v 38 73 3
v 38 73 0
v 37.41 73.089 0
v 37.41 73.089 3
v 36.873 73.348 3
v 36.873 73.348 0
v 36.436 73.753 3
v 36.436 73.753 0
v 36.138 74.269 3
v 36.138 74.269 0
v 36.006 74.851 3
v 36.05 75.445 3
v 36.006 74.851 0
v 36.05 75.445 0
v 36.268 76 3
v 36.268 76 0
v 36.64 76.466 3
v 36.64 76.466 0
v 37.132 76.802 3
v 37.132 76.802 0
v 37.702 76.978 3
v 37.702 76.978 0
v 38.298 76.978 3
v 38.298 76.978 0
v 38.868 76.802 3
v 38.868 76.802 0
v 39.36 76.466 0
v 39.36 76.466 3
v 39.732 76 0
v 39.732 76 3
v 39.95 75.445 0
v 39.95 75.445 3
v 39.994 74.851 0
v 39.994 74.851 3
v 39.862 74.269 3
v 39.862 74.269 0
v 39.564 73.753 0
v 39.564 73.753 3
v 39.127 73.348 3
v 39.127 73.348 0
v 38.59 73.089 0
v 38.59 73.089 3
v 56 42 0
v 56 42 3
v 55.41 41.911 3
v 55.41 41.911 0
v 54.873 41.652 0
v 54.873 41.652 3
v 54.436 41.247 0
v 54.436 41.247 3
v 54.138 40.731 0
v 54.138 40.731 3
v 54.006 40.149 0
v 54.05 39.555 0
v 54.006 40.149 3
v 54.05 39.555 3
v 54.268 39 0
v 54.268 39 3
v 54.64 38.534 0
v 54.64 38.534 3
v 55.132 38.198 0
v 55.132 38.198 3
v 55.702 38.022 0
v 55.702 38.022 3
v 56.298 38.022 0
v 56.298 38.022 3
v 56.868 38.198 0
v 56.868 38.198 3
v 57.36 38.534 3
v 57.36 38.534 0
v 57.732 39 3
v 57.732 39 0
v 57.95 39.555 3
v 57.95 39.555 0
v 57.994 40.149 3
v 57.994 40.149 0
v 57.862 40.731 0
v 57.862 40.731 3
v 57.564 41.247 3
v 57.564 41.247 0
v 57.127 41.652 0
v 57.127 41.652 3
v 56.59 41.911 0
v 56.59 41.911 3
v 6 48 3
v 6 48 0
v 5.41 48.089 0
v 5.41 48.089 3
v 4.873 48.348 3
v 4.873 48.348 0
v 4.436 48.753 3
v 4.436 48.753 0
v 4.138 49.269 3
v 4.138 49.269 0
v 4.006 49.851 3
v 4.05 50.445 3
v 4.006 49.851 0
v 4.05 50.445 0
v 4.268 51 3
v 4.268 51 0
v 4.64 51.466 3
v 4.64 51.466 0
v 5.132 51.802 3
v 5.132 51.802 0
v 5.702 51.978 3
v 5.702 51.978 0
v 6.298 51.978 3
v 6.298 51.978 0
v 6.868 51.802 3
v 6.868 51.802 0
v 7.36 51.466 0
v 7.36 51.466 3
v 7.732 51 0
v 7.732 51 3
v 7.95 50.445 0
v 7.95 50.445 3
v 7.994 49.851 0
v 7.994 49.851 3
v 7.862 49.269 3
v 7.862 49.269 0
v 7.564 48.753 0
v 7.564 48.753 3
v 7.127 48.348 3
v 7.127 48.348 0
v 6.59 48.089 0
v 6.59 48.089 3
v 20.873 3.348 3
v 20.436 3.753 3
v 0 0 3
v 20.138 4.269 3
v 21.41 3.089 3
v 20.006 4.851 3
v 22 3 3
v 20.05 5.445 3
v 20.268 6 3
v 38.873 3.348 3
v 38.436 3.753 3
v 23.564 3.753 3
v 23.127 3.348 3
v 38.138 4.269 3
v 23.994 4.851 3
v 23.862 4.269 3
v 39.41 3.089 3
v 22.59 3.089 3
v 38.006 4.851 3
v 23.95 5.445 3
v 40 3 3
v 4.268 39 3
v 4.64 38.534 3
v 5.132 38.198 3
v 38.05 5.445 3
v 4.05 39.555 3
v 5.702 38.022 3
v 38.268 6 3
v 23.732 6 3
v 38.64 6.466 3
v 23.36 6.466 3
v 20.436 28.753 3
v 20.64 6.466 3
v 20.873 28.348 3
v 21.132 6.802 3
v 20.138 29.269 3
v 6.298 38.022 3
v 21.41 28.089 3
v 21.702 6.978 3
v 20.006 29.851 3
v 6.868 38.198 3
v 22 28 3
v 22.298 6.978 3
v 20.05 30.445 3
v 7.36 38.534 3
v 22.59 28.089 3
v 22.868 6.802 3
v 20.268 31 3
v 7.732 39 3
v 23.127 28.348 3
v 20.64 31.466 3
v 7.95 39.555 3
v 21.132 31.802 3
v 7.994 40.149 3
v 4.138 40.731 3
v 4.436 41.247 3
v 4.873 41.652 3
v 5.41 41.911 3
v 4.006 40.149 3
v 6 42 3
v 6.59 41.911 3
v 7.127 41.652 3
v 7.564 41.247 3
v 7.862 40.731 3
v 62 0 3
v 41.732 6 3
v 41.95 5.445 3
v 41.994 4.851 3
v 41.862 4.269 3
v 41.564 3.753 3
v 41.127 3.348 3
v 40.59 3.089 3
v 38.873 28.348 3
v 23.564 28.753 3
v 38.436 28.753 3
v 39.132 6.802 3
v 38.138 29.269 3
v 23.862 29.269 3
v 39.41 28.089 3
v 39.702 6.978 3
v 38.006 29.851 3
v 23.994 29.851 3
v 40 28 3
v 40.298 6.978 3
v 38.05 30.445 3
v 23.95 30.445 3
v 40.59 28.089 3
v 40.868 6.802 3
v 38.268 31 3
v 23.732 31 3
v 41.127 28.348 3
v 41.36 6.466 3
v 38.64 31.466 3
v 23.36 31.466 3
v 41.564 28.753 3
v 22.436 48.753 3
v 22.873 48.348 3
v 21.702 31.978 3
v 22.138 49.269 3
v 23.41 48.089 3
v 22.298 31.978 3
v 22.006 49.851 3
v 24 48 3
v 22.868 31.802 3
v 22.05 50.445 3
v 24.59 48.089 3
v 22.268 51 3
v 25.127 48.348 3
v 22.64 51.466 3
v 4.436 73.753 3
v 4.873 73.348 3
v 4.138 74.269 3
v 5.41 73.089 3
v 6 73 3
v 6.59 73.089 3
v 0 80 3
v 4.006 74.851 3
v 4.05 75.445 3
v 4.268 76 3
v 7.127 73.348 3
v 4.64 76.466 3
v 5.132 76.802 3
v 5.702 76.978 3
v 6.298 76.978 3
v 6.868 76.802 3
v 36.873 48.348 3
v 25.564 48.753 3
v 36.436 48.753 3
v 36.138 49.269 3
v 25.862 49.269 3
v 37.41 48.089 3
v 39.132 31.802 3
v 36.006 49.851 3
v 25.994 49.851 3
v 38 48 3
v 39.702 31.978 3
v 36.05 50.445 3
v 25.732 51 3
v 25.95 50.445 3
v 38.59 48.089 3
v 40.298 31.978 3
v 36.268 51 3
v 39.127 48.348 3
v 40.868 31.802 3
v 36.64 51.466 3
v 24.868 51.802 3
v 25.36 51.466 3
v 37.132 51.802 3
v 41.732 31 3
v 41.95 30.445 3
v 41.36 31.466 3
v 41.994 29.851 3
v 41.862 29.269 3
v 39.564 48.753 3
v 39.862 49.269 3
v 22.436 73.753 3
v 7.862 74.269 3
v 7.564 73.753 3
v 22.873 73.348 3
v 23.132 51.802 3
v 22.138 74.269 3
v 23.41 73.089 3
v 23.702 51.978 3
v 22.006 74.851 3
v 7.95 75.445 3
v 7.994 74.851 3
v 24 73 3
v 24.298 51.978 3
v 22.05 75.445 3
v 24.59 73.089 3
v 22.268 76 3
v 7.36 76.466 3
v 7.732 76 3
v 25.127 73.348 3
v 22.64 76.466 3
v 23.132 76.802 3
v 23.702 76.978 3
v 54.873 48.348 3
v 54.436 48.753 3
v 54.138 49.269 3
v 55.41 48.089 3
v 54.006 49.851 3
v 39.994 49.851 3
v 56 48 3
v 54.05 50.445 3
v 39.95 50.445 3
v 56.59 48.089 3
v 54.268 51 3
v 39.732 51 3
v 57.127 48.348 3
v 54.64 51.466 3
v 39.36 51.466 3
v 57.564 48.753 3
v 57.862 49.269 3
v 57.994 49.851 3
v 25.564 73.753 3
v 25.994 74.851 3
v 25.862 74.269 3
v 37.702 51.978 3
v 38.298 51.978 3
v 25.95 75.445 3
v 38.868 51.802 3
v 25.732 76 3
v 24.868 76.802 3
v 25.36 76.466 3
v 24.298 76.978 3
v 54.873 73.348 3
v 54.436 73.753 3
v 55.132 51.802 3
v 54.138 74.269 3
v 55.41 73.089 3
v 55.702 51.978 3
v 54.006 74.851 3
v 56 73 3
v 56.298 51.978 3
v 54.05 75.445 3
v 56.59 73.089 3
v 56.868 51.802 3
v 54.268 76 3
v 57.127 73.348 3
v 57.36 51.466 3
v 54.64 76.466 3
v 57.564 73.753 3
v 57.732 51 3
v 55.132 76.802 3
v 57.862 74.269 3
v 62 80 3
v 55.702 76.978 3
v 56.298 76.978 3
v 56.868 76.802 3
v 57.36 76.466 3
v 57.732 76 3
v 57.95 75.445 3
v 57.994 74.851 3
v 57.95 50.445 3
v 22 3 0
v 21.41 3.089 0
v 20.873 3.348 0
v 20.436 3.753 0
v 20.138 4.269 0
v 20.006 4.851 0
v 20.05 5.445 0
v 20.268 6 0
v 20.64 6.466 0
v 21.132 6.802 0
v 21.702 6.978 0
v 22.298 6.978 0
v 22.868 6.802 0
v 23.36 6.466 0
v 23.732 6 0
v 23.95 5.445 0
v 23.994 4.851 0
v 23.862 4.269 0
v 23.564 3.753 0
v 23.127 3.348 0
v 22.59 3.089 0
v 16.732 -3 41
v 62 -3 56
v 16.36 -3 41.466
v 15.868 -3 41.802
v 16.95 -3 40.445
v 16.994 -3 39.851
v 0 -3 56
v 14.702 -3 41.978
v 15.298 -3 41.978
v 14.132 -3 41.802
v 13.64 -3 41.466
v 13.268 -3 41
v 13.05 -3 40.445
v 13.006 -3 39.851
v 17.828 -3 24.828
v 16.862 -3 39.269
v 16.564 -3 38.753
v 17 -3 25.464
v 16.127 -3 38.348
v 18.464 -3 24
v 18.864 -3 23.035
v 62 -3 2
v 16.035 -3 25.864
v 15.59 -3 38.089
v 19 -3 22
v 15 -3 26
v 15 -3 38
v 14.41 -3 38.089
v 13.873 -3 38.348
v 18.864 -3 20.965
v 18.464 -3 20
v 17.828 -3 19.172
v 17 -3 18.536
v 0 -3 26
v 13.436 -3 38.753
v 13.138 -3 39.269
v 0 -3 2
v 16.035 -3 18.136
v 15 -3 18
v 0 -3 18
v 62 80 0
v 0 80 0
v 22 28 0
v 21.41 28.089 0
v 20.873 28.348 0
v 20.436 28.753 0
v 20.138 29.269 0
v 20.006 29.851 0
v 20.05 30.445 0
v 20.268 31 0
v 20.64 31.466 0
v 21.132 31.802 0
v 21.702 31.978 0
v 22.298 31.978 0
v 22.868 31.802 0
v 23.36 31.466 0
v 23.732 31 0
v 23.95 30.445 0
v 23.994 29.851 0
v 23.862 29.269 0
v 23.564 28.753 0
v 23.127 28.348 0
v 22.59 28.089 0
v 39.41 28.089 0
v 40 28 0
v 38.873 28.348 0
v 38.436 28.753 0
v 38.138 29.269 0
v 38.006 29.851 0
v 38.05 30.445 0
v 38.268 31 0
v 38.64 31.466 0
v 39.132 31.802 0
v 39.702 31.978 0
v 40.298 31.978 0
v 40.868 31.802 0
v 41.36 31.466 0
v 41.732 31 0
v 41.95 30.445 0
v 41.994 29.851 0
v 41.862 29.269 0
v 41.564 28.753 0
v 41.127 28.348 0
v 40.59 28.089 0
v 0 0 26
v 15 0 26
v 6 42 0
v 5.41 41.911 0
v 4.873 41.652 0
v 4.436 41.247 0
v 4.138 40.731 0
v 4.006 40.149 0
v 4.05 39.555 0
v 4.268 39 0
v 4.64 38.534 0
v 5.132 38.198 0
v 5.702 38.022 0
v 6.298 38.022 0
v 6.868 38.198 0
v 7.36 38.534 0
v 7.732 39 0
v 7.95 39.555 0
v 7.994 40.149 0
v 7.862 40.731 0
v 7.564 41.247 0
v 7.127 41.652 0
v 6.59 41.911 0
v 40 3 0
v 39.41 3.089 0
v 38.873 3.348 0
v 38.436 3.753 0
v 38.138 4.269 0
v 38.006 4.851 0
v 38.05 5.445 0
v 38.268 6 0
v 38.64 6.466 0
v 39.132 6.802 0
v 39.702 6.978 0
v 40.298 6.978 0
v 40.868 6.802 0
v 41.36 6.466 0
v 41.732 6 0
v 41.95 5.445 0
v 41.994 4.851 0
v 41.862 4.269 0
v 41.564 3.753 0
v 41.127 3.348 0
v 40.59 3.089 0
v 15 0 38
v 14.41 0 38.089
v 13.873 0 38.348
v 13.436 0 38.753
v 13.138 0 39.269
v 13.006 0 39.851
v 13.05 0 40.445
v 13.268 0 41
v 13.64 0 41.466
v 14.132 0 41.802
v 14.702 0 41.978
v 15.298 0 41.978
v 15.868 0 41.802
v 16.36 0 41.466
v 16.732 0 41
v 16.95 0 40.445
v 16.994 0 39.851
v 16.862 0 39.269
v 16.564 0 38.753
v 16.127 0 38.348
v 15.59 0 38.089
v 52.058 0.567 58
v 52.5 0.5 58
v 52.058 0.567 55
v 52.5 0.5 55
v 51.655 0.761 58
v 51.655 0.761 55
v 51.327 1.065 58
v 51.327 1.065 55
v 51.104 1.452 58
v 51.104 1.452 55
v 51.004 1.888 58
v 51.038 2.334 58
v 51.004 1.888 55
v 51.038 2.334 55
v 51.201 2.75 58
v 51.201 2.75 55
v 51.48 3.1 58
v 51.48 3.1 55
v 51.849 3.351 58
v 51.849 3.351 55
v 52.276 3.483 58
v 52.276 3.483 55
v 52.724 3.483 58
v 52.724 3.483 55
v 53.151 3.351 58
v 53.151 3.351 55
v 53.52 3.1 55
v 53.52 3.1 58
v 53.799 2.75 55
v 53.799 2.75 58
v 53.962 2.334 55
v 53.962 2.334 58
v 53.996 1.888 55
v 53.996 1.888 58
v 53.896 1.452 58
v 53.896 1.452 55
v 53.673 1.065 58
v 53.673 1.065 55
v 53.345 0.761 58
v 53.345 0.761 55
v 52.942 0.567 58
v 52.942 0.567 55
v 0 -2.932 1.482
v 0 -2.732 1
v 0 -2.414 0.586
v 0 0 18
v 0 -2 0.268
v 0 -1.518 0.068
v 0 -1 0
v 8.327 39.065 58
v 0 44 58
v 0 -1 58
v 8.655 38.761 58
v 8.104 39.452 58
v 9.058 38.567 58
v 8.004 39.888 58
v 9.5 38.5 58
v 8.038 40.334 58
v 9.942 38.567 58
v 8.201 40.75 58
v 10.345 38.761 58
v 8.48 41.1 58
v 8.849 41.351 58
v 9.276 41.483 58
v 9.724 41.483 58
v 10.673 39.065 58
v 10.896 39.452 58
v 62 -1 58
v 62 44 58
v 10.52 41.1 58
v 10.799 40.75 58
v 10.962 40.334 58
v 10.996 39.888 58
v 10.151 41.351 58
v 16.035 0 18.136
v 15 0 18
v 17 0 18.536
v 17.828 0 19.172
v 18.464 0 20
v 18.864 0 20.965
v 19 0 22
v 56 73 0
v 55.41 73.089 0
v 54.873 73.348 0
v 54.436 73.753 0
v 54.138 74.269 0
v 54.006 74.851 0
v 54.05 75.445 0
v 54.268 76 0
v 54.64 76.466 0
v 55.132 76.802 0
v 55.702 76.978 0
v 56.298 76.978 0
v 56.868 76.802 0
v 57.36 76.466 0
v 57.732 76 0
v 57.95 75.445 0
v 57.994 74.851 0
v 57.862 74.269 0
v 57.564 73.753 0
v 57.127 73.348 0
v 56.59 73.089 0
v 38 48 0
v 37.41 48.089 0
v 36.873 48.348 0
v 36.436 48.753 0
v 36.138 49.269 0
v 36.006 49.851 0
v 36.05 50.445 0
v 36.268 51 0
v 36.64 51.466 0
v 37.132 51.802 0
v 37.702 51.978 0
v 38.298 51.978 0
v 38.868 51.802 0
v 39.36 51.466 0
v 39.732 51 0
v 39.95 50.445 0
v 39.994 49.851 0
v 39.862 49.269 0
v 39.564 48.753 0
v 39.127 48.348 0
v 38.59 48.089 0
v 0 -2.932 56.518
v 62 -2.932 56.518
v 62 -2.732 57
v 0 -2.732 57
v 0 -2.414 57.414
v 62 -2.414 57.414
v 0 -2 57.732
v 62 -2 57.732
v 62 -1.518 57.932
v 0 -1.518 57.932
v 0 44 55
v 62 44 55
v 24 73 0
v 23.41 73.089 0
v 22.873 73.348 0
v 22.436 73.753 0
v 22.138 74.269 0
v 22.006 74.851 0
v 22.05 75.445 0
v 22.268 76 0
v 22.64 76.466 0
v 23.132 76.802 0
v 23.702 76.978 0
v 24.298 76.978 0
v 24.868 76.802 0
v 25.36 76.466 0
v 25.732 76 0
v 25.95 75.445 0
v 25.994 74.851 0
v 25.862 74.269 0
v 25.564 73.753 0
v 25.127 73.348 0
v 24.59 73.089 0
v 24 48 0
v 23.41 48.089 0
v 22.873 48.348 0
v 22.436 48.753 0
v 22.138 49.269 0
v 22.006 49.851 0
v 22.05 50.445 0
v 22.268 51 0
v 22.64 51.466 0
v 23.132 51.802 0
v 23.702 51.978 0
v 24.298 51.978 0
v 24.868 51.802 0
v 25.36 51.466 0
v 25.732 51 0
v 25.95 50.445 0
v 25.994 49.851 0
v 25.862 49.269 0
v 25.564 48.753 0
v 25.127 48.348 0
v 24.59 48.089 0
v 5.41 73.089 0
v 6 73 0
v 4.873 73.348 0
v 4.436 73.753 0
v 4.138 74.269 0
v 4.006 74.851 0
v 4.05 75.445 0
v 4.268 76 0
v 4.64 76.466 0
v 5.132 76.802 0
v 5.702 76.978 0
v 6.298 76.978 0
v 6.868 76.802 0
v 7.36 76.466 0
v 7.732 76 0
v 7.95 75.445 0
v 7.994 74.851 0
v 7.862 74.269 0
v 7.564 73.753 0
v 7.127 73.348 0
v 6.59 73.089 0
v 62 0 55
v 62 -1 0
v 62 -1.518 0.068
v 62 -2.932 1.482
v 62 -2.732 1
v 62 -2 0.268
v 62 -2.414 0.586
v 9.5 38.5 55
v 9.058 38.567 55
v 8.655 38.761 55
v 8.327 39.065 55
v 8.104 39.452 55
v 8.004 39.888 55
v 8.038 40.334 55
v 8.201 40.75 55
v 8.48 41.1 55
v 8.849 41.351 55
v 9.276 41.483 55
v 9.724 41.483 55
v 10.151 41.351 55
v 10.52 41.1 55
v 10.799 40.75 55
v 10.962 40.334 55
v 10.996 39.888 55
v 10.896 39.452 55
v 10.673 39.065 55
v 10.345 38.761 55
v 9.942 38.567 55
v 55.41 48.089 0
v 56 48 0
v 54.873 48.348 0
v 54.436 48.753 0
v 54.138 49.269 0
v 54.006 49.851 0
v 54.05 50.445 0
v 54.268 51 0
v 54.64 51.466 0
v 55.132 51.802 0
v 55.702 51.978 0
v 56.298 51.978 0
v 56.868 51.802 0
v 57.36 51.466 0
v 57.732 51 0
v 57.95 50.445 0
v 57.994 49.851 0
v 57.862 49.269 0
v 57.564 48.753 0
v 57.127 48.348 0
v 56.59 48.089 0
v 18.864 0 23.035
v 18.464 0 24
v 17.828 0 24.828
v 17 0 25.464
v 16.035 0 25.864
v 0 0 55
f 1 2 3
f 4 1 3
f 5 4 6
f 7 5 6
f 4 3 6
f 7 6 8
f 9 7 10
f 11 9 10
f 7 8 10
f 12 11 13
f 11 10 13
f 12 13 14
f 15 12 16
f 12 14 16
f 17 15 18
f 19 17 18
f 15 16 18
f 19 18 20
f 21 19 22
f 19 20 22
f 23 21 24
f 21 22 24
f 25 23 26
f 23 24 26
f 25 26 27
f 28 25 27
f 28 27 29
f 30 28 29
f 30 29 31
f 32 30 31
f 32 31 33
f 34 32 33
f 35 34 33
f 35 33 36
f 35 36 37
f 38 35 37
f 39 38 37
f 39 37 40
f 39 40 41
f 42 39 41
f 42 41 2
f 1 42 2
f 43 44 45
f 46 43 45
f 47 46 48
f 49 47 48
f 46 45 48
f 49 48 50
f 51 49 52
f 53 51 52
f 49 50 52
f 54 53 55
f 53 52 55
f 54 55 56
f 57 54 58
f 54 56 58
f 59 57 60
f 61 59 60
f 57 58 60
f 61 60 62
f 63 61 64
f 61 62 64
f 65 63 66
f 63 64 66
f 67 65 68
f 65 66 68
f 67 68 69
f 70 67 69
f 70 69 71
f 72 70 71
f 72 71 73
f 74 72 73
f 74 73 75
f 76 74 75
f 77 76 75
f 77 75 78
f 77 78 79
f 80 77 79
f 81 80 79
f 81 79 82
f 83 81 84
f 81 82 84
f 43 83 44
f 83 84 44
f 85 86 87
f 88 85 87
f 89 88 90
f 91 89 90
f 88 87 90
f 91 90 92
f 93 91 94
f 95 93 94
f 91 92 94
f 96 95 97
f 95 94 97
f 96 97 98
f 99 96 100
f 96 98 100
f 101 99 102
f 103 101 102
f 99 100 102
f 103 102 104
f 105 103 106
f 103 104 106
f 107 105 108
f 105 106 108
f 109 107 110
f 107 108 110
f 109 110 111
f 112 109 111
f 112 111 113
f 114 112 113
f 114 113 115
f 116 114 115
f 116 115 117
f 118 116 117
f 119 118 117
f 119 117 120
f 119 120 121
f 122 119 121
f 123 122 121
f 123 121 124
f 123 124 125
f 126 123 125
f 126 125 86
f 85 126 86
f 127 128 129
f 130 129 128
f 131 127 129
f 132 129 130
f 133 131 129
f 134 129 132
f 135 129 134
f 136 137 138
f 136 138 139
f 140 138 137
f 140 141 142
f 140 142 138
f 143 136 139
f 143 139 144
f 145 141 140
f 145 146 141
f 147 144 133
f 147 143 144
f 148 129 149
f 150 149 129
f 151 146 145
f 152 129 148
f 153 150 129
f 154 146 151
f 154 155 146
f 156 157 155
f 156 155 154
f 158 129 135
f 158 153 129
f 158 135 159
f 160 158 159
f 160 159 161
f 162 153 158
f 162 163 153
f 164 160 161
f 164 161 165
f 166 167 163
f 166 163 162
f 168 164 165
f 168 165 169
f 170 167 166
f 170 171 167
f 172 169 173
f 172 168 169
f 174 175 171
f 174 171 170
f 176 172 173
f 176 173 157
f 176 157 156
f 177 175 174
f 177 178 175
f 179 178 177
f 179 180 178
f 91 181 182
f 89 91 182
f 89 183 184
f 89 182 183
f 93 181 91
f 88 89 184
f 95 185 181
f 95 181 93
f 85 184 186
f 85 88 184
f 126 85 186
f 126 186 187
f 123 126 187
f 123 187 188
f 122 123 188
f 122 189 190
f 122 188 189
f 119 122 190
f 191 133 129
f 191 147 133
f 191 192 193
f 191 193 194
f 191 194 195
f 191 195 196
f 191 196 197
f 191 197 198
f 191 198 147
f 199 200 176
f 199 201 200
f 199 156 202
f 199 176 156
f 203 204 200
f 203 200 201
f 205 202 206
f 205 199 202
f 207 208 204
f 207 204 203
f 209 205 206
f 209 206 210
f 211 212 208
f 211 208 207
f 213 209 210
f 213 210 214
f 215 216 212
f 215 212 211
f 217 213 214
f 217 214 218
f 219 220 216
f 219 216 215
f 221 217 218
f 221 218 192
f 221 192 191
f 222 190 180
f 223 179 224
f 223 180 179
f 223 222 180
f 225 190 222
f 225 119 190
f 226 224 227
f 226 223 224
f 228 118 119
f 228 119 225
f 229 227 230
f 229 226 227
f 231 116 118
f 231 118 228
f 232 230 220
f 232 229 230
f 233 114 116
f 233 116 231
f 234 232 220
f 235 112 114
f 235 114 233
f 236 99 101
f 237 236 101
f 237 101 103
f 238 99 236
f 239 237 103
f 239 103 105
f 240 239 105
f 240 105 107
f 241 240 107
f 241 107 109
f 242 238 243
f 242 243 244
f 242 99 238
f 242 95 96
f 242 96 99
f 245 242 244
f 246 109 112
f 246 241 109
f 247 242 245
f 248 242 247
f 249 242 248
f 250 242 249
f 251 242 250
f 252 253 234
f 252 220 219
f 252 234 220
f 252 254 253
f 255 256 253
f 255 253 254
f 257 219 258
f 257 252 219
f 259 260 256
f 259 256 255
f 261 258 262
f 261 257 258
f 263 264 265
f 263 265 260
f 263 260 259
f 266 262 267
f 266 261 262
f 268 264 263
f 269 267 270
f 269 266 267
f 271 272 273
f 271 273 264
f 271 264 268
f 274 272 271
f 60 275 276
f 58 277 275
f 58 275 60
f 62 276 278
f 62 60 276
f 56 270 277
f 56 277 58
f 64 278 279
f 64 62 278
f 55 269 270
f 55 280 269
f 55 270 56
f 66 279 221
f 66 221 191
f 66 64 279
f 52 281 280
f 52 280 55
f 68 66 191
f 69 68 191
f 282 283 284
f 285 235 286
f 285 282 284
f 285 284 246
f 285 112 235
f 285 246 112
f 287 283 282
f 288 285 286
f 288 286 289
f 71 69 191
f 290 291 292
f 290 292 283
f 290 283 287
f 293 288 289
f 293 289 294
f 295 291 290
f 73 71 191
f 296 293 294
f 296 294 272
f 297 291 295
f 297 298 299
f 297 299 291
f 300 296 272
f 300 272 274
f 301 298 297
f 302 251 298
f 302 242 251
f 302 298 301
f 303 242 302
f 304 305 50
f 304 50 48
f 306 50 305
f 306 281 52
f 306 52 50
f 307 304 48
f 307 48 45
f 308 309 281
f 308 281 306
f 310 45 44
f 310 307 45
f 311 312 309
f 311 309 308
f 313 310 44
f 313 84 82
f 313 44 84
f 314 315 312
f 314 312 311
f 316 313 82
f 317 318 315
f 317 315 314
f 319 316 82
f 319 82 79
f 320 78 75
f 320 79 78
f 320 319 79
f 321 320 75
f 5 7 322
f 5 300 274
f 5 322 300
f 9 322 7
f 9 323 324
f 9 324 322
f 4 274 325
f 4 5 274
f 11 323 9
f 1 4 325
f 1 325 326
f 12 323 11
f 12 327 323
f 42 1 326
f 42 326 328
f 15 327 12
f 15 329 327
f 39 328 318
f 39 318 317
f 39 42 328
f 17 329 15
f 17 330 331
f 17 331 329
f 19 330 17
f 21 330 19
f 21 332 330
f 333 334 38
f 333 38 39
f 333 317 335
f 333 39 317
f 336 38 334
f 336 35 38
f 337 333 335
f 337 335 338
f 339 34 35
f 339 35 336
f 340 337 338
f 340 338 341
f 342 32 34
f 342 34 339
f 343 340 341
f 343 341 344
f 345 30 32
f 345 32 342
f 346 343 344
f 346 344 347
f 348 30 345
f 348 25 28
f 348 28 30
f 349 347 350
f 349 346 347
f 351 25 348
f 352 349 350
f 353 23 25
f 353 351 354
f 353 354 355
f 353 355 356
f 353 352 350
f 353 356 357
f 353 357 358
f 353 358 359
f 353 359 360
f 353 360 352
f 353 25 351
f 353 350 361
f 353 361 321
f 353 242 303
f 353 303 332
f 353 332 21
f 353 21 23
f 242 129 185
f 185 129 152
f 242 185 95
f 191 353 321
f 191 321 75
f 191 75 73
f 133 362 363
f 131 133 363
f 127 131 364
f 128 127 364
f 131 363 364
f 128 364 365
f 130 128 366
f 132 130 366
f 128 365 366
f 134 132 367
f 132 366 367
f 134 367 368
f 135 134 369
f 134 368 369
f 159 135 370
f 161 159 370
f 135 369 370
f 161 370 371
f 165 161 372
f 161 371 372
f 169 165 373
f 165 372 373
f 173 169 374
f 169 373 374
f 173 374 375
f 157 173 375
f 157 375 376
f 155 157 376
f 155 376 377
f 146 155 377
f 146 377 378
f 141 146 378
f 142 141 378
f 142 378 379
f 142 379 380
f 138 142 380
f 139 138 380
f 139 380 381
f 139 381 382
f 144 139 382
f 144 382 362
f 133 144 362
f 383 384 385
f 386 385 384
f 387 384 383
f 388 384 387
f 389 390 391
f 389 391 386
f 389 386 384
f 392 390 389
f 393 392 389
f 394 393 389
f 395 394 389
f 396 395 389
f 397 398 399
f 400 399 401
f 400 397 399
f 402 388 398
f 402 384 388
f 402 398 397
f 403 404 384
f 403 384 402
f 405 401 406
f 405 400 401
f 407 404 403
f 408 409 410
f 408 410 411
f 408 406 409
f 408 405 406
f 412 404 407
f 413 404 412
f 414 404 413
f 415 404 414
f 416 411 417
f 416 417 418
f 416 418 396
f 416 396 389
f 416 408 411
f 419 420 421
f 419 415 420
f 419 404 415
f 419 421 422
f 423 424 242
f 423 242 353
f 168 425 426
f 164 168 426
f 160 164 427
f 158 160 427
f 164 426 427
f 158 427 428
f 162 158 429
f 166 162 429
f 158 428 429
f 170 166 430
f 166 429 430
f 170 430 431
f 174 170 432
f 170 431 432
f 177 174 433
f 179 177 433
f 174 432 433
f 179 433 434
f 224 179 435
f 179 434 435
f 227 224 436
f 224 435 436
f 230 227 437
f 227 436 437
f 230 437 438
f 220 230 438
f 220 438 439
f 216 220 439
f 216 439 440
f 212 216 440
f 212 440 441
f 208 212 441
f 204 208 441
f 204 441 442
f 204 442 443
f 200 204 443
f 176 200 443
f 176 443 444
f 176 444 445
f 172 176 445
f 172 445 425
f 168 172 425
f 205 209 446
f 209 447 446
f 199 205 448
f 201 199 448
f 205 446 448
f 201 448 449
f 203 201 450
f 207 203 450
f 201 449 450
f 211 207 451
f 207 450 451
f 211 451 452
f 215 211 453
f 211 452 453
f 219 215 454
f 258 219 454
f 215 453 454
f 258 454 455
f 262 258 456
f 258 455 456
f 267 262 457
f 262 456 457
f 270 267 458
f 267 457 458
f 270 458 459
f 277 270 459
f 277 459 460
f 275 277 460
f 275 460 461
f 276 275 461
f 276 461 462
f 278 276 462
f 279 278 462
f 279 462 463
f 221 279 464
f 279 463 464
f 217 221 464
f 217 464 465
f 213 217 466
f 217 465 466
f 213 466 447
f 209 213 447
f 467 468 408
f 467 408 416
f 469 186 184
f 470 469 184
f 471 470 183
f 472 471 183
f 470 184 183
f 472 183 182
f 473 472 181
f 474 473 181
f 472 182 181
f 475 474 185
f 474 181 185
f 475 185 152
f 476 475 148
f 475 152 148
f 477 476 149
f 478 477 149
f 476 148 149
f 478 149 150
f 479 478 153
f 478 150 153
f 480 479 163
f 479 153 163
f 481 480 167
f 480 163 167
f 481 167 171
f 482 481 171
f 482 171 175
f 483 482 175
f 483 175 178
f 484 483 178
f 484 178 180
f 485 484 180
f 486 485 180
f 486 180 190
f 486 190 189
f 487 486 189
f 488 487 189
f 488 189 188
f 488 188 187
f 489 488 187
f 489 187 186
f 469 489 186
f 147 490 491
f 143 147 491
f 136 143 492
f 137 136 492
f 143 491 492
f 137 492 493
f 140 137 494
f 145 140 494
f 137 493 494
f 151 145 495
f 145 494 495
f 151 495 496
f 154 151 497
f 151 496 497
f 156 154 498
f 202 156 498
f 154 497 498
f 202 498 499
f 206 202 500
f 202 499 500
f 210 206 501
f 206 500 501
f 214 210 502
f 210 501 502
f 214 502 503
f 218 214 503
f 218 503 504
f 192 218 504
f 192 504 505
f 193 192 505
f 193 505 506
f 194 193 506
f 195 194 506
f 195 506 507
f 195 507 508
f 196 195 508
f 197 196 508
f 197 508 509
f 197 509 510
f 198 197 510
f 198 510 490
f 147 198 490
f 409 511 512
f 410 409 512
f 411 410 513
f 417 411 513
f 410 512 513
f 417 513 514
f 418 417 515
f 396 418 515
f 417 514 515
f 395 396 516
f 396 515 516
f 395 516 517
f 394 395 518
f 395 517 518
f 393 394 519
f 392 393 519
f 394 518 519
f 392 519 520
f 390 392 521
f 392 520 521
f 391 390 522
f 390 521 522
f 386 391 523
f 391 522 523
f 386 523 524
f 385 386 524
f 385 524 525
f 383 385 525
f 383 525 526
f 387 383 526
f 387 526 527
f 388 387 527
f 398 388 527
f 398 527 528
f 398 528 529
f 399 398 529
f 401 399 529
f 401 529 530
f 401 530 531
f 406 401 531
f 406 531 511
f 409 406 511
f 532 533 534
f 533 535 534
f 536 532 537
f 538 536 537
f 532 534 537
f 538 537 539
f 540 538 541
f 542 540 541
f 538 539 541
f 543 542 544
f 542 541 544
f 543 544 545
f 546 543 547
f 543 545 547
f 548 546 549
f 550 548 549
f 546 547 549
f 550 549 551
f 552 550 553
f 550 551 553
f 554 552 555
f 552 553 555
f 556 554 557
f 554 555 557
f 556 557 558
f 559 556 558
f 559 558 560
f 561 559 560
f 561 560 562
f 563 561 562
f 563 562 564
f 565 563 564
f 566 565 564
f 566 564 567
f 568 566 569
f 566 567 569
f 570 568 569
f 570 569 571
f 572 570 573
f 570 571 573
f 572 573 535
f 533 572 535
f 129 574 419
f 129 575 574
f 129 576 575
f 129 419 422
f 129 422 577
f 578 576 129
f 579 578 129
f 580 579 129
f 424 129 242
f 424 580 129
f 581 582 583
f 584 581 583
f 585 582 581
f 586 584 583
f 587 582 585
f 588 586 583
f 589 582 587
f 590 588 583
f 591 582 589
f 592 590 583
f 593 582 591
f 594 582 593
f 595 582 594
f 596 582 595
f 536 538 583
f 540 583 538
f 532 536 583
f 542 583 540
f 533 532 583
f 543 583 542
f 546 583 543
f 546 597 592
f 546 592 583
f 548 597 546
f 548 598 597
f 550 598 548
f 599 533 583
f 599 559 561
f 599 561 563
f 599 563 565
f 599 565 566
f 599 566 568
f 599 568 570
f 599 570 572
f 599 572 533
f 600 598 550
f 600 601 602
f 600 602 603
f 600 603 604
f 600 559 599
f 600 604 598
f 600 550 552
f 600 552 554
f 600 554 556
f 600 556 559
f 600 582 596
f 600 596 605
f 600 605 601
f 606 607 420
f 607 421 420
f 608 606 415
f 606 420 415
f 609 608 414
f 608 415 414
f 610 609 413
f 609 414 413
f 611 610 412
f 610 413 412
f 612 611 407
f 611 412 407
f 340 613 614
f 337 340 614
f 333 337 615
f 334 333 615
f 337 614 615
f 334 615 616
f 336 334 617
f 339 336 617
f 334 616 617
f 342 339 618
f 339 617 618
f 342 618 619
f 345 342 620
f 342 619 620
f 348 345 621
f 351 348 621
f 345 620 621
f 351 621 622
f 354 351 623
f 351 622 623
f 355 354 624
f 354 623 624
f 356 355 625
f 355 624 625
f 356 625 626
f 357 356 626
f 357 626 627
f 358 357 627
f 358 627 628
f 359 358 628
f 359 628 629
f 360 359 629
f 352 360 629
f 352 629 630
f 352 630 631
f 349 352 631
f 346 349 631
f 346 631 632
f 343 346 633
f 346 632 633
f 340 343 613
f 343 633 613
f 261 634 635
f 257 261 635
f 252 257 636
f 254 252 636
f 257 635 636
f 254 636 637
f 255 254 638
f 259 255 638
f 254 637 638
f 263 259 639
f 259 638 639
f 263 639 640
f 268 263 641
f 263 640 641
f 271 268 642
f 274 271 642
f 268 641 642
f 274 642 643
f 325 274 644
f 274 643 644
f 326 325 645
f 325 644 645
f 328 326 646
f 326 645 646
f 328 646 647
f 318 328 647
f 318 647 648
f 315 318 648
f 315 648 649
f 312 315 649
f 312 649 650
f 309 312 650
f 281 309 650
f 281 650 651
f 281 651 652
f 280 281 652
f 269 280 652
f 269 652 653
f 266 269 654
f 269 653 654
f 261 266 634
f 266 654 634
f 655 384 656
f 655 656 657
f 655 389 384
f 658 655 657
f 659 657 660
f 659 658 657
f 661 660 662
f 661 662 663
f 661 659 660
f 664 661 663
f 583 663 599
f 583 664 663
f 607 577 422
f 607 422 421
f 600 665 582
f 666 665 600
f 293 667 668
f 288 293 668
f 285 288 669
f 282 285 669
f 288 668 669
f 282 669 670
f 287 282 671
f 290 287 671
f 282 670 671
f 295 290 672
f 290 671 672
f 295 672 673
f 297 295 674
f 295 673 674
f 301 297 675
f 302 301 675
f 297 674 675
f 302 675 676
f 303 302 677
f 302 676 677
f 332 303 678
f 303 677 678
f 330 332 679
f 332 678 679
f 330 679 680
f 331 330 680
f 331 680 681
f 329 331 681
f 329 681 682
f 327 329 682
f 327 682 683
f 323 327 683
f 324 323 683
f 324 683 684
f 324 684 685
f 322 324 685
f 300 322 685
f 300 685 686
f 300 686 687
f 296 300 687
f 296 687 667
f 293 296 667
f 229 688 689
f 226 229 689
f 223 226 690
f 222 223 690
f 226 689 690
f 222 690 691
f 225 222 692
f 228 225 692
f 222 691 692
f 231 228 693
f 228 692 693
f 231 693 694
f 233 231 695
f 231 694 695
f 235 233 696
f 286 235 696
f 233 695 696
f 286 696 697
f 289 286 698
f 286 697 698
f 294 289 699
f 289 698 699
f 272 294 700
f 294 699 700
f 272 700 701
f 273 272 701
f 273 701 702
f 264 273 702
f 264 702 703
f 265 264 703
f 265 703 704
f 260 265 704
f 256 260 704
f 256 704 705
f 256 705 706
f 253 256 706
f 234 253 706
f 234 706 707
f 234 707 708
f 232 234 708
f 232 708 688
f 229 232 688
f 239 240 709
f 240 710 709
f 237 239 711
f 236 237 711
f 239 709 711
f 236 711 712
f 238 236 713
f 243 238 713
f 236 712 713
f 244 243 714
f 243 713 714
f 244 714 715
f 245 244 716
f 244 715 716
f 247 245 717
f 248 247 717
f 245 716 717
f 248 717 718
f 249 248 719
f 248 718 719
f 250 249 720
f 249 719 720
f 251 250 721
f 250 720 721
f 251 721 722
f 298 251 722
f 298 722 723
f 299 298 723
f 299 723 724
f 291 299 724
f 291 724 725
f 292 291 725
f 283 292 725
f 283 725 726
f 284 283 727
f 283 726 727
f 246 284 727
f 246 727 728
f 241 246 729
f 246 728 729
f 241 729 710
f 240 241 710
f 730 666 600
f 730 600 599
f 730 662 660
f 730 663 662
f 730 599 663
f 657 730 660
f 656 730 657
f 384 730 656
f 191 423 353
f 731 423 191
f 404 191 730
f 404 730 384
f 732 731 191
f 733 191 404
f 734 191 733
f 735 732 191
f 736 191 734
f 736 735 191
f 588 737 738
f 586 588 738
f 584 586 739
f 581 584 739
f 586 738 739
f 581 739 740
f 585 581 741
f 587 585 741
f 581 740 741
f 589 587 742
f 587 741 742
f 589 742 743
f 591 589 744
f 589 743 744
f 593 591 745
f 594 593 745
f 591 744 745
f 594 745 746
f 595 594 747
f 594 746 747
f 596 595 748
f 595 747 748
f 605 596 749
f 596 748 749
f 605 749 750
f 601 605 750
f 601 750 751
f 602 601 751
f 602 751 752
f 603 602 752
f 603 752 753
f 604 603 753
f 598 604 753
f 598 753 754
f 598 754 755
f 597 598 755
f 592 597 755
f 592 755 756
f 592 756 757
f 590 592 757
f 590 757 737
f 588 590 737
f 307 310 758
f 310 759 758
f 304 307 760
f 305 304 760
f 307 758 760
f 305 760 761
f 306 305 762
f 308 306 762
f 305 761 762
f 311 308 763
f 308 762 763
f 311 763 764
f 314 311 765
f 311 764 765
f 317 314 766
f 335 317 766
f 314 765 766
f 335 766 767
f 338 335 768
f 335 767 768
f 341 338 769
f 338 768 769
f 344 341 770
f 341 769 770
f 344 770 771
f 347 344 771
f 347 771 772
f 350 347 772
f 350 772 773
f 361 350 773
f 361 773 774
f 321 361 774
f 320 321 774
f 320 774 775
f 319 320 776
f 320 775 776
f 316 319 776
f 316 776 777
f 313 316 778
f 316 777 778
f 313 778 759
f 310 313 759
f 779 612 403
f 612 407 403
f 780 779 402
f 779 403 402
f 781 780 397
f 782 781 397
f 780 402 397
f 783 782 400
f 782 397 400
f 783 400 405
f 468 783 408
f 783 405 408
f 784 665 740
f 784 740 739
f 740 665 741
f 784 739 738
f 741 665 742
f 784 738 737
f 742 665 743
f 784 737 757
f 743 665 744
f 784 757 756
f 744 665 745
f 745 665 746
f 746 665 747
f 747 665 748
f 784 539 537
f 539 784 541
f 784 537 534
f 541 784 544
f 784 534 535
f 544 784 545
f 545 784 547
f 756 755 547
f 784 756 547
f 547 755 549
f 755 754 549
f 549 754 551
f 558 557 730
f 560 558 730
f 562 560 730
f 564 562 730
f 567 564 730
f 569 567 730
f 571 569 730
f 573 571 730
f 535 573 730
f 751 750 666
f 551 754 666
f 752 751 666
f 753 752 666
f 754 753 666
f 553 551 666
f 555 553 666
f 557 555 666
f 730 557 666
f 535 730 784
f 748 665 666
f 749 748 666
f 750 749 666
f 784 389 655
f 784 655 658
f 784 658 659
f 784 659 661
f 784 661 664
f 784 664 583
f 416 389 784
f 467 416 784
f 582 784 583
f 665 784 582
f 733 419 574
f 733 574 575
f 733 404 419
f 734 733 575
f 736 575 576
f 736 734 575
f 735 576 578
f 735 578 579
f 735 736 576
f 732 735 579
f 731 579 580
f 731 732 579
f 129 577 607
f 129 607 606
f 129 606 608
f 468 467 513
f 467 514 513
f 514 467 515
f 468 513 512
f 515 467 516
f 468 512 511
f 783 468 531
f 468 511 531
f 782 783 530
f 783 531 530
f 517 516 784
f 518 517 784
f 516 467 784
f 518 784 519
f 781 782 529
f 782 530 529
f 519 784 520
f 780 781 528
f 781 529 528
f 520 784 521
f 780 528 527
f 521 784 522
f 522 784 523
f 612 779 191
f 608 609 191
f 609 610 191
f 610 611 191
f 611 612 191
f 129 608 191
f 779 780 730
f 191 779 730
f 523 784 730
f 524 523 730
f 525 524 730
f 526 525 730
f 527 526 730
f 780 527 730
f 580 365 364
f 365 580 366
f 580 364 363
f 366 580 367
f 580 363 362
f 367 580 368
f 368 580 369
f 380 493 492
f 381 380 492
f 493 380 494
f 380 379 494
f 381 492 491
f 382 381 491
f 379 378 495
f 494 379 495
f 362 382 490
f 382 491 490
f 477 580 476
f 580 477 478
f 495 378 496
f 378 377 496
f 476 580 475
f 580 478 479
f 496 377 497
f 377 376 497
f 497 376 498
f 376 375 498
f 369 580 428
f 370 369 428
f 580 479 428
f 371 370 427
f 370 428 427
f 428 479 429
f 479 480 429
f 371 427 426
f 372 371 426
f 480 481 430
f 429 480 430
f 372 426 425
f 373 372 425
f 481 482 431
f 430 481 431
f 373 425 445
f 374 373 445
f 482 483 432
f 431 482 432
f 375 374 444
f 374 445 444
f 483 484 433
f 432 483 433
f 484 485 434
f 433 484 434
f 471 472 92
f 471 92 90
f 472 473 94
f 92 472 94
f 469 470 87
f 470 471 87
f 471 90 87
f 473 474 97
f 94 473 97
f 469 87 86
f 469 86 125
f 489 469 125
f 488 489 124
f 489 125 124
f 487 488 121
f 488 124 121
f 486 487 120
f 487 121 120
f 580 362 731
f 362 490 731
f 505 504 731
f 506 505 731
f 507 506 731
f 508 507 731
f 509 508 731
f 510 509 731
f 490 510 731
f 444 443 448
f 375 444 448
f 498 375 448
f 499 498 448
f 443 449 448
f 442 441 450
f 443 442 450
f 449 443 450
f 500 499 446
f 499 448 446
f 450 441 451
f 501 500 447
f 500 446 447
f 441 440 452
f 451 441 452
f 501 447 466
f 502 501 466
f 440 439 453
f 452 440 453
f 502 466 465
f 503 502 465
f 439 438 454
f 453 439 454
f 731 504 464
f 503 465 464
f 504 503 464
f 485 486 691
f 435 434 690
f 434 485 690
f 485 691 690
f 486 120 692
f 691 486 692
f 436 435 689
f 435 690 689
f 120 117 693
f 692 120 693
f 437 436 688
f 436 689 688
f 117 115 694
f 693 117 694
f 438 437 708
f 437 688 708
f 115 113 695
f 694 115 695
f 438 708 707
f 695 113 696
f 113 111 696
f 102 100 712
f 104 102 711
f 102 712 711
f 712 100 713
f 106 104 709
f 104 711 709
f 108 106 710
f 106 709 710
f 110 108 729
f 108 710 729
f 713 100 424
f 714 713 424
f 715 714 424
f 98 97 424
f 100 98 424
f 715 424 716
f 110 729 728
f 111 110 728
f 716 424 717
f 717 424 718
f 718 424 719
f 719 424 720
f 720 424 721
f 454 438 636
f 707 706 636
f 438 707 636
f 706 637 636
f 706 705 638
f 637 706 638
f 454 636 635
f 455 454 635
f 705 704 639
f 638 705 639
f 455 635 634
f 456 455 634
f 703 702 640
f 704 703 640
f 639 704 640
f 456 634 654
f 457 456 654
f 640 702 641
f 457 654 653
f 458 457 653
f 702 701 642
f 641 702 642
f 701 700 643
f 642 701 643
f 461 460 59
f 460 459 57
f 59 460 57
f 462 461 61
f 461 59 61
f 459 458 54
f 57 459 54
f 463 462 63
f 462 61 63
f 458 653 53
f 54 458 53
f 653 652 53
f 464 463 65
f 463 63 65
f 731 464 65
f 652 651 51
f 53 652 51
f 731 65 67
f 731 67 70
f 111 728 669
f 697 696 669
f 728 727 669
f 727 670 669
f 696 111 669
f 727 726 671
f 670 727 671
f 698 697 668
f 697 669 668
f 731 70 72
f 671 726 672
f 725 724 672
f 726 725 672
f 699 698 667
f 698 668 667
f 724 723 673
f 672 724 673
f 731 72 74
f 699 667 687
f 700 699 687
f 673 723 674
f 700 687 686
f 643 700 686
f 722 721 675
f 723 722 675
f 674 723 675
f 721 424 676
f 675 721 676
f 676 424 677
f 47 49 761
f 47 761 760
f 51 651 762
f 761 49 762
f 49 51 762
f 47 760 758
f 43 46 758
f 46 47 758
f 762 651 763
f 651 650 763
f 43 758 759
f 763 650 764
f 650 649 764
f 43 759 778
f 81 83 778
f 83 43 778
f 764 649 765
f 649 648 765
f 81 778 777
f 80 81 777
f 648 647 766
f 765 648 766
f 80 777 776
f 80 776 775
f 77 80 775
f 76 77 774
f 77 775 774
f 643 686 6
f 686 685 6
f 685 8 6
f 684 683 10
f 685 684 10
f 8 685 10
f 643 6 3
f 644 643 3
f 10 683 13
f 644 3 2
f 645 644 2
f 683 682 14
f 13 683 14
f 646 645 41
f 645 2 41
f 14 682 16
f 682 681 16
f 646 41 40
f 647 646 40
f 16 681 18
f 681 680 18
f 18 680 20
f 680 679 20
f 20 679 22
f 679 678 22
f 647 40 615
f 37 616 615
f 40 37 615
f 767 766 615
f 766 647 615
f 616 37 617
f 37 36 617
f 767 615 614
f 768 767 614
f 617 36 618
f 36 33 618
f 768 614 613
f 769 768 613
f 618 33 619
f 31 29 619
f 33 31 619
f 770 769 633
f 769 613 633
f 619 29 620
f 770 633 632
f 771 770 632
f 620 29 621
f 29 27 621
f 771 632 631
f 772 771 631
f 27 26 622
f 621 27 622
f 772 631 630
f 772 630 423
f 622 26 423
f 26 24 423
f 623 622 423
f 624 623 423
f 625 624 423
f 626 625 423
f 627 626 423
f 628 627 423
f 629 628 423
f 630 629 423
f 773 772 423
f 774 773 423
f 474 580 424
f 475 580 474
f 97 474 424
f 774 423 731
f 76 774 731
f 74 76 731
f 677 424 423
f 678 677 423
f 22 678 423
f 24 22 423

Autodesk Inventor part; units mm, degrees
ref_plane "YZ Plane" through (0, 0, 0) normal (1, 0, 0) x (0, 1, 0)
ref_plane "XZ Plane" through (0, 0, 0) normal (0, 1, 0) x (-1, 0, 0)
ref_plane "XY Plane" through (0, 0, 0) normal (0, 0, 1) x (1, 0, 0)
sketch "Szkic1" plane through (0, 0, 0) normal (0, 0, 1) x (1, 0, 0)
  line L0 (0, 80) -> (62, 80)
  line L1 (62, 80) -> (62, 0)
  line L2 (62, 0) -> (0, 0)
  line L3 (0, 0) -> (0, 80)
  point P0 (0, 0)
  dimension "d0" = 80
  dimension "d1" = 62
extrude "Wyciągnięcie proste1" add sketch "Szkic1" along normal blind 3
sketch "Szkic2" plane through (0, 0, 3) normal (0, 0, 1) x (1, 0, 0)
  line L0 (0, 80) -> (0, 0) projected
  line L1 (62, 80) -> (0, 80) projected
  line L2 (31, 80) -> (31, 0) construction
  line L3 (0, 0) -> (62, 0) projected
  line L4 (56, 75) -> (56, 50) construction
  line L5 (56, 62.5) -> (62, 62.5) construction
  line L6 (40, 30) -> (40, 5) construction
  line L7 (40, 17.5) -> (62.4441, 17.5) construction
  point P0 (6, 75)
  point P1 (24, 75)
  point P2 (24, 50)
  point P3 (6, 50)
  point P4 (38, 50)
  point P5 (38, 75)
  point P6 (22, 30)
  point P7 (22, 5)
  dimension "d4" = 18
  dimension "d5" = 25
  dimension "d6" = 6
  dimension "d7" = 5
  dimension "d10" = 32
  dimension "d15" = 18
  dimension "d16" = 25
  dimension "d17" = 45
hole "Otwór1" at (6, 75, 3) at (24, 75, 3) at (24, 50, 3) at (6, 50, 3) at (38, 50, 3) at (56, 50, 3) at (56, 75, 3) at (38, 75, 3) at (22, 30, 3) at (40, 30, 3) at (40, 5, 3) at (22, 5, 3) direction (0, 0, -1) diameter 4 end through all
sketch "Szkic3" plane through (0, 0, 0) normal (0, -1, 0) x (1, 0, 0)
  line L0 (0, 0) -> (62, 0)
  line L1 (62, 0) -> (62, 55)
  line L2 (62, 55) -> (0, 55)
  line L3 (0, 55) -> (0, 0)
  line L4 (62, 0) -> (62, 3) projected
  point P0 (62, 1.5)
  dimension "d25" = 55
extrude "Wyciągnięcie proste2" add sketch "Szkic3" along normal blind 3
sketch "Szkic4" plane through (0, 0, 55) normal (0, 0, 1) x (1, 0, 0)
  line L0 (62, 80) -> (62, -3) projected
  line L1 (62, -3) -> (0, -3)
  line L2 (0, -3) -> (0, 44)
  line L3 (0, 44) -> (62, 44)
  line L4 (62, 44) -> (62, -3)
  line L5 (0, 0) -> (0, -3) projected
  point P0 (0, -1.5)
  dimension "d28" = 47
extrude "Wyciągnięcie proste3" add sketch "Szkic4" along normal blind 3
sketch "Szkic5" plane through (0, 0, 0) normal (0, 0, -1) x (-1, 0, 0)
  line L0 (0, -3) -> (-62, -3) projected
  line L1 (0, -3) -> (0, 80) projected
  line L2 (-31, -3) -> (-31, 80) construction
  line L3 (-62, 80) -> (0, 80) projected
  point P0 (0, 0)
  point P1 (-6, 40)
  point P2 (-56, 40)
  dimension "d31" = 43
  dimension "d32" = 6
hole "Otwór2" at (6, 40, 0) at (56, 40, 0) direction (0, 0, 1) diameter 4 end up to surface
thread "Gwint1" size "M4x0.7" class "6H" standard "ANSI Metric M Profile" full length
thread "Gwint2" size "M4x0.7" class "6H" standard "ANSI Metric M Profile" full length
thread "Gwint3" size "M4x0.7" class "6H" standard "ANSI Metric M Profile" full length
thread "Gwint4" size "M4x0.7" class "6H" standard "ANSI Metric M Profile" full length
thread "Gwint5" size "M4x0.7" class "6H" standard "ANSI Metric M Profile" full length
thread "Gwint6" size "M4x0.7" class "6H" standard "ANSI Metric M Profile" full length
thread "Gwint7" size "M4x0.7" class "6H" standard "ANSI Metric M Profile" full length
thread "Gwint8" size "M4x0.7" class "6H" standard "ANSI Metric M Profile" full length
thread "Gwint9" size "M4x0.7" class "6H" standard "ANSI Metric M Profile" full length
thread "Gwint10" size "M4x0.7" class "6H" standard "ANSI Metric M Profile" full length
thread "Gwint11" size "M4x0.7" class "6H" standard "ANSI Metric M Profile" full length
thread "Gwint12" size "M4x0.7" class "6H" standard "ANSI Metric M Profile" full length
thread "Gwint13" size "M4x0.7" class "6H" standard "ANSI Metric M Profile" full length
thread "Gwint14" size "M4x0.7" class "6H" standard "ANSI Metric M Profile" full length
sketch "Szkic6" plane through (0, 0, 0) normal (0, 1, 0) x (1, 0, 0)
  line L0 (0, -18) -> (19, -18)
  line L1 (19, -18) -> (19, -26)
  line L2 (19, -26) -> (0, -26)
  line L3 (0, -26) -> (0, -18)
  line L4 (62, -3) -> (0, -3) projected
  point P0 (0, 0)
  dimension "d68" = 15
  dimension "d69" = 8
  dimension "d70" = 19
extrude "Wyciągnięcie proste4" cut sketch "Szkic6" against normal through all
full round fillet "Zaokrąglenie1" first side at (6.3333, -1, 18) centre faces at (19, -1, 20.6667) second side at (6.3333, -2, 26)
sketch "Szkic7" plane through (0, -3, 0) normal (0, -1, 0) x (1, 0, 0)
  line L0 (0, 58) -> (62, 58) projected
  line L1 (0, 26) -> (0, 58) projected
  point P0 (0, 0)
  point P1 (15, 40)
  dimension "d73" = 18
  dimension "d74" = 15
hole "Otwór3" at (15, -3, 40) direction (0, 1, 0) diameter 4 end through all
fillet "Zaokrąglenie2" radius 2 2 edges at (31, -3, 58) (31, -3, 0)
sketch "Szkic8" plane through (0, 0, 58) normal (0, 0, 1) x (1, 0, 0)
  line L0 (62, 44) -> (0, 44) projected
  line L1 (31, 44) -> (31, 0) construction
  line L2 (62, 0) -> (0, 0) projected
  line L3 (0, 80) -> (0, 0) projected
  point P0 (9.5, 40)
  point P1 (52.5, 2)
  dimension "d83" = 43
  dimension "d84" = 38
  dimension "d85" = 21.5
  dimension "d86" = 4
hole "Otwór4" at (9.5, 40, 58) at (52.5, 2, 58) direction (0, 0, -1) diameter 3 depth 8 tip angle 118
properties part number "gantry"
